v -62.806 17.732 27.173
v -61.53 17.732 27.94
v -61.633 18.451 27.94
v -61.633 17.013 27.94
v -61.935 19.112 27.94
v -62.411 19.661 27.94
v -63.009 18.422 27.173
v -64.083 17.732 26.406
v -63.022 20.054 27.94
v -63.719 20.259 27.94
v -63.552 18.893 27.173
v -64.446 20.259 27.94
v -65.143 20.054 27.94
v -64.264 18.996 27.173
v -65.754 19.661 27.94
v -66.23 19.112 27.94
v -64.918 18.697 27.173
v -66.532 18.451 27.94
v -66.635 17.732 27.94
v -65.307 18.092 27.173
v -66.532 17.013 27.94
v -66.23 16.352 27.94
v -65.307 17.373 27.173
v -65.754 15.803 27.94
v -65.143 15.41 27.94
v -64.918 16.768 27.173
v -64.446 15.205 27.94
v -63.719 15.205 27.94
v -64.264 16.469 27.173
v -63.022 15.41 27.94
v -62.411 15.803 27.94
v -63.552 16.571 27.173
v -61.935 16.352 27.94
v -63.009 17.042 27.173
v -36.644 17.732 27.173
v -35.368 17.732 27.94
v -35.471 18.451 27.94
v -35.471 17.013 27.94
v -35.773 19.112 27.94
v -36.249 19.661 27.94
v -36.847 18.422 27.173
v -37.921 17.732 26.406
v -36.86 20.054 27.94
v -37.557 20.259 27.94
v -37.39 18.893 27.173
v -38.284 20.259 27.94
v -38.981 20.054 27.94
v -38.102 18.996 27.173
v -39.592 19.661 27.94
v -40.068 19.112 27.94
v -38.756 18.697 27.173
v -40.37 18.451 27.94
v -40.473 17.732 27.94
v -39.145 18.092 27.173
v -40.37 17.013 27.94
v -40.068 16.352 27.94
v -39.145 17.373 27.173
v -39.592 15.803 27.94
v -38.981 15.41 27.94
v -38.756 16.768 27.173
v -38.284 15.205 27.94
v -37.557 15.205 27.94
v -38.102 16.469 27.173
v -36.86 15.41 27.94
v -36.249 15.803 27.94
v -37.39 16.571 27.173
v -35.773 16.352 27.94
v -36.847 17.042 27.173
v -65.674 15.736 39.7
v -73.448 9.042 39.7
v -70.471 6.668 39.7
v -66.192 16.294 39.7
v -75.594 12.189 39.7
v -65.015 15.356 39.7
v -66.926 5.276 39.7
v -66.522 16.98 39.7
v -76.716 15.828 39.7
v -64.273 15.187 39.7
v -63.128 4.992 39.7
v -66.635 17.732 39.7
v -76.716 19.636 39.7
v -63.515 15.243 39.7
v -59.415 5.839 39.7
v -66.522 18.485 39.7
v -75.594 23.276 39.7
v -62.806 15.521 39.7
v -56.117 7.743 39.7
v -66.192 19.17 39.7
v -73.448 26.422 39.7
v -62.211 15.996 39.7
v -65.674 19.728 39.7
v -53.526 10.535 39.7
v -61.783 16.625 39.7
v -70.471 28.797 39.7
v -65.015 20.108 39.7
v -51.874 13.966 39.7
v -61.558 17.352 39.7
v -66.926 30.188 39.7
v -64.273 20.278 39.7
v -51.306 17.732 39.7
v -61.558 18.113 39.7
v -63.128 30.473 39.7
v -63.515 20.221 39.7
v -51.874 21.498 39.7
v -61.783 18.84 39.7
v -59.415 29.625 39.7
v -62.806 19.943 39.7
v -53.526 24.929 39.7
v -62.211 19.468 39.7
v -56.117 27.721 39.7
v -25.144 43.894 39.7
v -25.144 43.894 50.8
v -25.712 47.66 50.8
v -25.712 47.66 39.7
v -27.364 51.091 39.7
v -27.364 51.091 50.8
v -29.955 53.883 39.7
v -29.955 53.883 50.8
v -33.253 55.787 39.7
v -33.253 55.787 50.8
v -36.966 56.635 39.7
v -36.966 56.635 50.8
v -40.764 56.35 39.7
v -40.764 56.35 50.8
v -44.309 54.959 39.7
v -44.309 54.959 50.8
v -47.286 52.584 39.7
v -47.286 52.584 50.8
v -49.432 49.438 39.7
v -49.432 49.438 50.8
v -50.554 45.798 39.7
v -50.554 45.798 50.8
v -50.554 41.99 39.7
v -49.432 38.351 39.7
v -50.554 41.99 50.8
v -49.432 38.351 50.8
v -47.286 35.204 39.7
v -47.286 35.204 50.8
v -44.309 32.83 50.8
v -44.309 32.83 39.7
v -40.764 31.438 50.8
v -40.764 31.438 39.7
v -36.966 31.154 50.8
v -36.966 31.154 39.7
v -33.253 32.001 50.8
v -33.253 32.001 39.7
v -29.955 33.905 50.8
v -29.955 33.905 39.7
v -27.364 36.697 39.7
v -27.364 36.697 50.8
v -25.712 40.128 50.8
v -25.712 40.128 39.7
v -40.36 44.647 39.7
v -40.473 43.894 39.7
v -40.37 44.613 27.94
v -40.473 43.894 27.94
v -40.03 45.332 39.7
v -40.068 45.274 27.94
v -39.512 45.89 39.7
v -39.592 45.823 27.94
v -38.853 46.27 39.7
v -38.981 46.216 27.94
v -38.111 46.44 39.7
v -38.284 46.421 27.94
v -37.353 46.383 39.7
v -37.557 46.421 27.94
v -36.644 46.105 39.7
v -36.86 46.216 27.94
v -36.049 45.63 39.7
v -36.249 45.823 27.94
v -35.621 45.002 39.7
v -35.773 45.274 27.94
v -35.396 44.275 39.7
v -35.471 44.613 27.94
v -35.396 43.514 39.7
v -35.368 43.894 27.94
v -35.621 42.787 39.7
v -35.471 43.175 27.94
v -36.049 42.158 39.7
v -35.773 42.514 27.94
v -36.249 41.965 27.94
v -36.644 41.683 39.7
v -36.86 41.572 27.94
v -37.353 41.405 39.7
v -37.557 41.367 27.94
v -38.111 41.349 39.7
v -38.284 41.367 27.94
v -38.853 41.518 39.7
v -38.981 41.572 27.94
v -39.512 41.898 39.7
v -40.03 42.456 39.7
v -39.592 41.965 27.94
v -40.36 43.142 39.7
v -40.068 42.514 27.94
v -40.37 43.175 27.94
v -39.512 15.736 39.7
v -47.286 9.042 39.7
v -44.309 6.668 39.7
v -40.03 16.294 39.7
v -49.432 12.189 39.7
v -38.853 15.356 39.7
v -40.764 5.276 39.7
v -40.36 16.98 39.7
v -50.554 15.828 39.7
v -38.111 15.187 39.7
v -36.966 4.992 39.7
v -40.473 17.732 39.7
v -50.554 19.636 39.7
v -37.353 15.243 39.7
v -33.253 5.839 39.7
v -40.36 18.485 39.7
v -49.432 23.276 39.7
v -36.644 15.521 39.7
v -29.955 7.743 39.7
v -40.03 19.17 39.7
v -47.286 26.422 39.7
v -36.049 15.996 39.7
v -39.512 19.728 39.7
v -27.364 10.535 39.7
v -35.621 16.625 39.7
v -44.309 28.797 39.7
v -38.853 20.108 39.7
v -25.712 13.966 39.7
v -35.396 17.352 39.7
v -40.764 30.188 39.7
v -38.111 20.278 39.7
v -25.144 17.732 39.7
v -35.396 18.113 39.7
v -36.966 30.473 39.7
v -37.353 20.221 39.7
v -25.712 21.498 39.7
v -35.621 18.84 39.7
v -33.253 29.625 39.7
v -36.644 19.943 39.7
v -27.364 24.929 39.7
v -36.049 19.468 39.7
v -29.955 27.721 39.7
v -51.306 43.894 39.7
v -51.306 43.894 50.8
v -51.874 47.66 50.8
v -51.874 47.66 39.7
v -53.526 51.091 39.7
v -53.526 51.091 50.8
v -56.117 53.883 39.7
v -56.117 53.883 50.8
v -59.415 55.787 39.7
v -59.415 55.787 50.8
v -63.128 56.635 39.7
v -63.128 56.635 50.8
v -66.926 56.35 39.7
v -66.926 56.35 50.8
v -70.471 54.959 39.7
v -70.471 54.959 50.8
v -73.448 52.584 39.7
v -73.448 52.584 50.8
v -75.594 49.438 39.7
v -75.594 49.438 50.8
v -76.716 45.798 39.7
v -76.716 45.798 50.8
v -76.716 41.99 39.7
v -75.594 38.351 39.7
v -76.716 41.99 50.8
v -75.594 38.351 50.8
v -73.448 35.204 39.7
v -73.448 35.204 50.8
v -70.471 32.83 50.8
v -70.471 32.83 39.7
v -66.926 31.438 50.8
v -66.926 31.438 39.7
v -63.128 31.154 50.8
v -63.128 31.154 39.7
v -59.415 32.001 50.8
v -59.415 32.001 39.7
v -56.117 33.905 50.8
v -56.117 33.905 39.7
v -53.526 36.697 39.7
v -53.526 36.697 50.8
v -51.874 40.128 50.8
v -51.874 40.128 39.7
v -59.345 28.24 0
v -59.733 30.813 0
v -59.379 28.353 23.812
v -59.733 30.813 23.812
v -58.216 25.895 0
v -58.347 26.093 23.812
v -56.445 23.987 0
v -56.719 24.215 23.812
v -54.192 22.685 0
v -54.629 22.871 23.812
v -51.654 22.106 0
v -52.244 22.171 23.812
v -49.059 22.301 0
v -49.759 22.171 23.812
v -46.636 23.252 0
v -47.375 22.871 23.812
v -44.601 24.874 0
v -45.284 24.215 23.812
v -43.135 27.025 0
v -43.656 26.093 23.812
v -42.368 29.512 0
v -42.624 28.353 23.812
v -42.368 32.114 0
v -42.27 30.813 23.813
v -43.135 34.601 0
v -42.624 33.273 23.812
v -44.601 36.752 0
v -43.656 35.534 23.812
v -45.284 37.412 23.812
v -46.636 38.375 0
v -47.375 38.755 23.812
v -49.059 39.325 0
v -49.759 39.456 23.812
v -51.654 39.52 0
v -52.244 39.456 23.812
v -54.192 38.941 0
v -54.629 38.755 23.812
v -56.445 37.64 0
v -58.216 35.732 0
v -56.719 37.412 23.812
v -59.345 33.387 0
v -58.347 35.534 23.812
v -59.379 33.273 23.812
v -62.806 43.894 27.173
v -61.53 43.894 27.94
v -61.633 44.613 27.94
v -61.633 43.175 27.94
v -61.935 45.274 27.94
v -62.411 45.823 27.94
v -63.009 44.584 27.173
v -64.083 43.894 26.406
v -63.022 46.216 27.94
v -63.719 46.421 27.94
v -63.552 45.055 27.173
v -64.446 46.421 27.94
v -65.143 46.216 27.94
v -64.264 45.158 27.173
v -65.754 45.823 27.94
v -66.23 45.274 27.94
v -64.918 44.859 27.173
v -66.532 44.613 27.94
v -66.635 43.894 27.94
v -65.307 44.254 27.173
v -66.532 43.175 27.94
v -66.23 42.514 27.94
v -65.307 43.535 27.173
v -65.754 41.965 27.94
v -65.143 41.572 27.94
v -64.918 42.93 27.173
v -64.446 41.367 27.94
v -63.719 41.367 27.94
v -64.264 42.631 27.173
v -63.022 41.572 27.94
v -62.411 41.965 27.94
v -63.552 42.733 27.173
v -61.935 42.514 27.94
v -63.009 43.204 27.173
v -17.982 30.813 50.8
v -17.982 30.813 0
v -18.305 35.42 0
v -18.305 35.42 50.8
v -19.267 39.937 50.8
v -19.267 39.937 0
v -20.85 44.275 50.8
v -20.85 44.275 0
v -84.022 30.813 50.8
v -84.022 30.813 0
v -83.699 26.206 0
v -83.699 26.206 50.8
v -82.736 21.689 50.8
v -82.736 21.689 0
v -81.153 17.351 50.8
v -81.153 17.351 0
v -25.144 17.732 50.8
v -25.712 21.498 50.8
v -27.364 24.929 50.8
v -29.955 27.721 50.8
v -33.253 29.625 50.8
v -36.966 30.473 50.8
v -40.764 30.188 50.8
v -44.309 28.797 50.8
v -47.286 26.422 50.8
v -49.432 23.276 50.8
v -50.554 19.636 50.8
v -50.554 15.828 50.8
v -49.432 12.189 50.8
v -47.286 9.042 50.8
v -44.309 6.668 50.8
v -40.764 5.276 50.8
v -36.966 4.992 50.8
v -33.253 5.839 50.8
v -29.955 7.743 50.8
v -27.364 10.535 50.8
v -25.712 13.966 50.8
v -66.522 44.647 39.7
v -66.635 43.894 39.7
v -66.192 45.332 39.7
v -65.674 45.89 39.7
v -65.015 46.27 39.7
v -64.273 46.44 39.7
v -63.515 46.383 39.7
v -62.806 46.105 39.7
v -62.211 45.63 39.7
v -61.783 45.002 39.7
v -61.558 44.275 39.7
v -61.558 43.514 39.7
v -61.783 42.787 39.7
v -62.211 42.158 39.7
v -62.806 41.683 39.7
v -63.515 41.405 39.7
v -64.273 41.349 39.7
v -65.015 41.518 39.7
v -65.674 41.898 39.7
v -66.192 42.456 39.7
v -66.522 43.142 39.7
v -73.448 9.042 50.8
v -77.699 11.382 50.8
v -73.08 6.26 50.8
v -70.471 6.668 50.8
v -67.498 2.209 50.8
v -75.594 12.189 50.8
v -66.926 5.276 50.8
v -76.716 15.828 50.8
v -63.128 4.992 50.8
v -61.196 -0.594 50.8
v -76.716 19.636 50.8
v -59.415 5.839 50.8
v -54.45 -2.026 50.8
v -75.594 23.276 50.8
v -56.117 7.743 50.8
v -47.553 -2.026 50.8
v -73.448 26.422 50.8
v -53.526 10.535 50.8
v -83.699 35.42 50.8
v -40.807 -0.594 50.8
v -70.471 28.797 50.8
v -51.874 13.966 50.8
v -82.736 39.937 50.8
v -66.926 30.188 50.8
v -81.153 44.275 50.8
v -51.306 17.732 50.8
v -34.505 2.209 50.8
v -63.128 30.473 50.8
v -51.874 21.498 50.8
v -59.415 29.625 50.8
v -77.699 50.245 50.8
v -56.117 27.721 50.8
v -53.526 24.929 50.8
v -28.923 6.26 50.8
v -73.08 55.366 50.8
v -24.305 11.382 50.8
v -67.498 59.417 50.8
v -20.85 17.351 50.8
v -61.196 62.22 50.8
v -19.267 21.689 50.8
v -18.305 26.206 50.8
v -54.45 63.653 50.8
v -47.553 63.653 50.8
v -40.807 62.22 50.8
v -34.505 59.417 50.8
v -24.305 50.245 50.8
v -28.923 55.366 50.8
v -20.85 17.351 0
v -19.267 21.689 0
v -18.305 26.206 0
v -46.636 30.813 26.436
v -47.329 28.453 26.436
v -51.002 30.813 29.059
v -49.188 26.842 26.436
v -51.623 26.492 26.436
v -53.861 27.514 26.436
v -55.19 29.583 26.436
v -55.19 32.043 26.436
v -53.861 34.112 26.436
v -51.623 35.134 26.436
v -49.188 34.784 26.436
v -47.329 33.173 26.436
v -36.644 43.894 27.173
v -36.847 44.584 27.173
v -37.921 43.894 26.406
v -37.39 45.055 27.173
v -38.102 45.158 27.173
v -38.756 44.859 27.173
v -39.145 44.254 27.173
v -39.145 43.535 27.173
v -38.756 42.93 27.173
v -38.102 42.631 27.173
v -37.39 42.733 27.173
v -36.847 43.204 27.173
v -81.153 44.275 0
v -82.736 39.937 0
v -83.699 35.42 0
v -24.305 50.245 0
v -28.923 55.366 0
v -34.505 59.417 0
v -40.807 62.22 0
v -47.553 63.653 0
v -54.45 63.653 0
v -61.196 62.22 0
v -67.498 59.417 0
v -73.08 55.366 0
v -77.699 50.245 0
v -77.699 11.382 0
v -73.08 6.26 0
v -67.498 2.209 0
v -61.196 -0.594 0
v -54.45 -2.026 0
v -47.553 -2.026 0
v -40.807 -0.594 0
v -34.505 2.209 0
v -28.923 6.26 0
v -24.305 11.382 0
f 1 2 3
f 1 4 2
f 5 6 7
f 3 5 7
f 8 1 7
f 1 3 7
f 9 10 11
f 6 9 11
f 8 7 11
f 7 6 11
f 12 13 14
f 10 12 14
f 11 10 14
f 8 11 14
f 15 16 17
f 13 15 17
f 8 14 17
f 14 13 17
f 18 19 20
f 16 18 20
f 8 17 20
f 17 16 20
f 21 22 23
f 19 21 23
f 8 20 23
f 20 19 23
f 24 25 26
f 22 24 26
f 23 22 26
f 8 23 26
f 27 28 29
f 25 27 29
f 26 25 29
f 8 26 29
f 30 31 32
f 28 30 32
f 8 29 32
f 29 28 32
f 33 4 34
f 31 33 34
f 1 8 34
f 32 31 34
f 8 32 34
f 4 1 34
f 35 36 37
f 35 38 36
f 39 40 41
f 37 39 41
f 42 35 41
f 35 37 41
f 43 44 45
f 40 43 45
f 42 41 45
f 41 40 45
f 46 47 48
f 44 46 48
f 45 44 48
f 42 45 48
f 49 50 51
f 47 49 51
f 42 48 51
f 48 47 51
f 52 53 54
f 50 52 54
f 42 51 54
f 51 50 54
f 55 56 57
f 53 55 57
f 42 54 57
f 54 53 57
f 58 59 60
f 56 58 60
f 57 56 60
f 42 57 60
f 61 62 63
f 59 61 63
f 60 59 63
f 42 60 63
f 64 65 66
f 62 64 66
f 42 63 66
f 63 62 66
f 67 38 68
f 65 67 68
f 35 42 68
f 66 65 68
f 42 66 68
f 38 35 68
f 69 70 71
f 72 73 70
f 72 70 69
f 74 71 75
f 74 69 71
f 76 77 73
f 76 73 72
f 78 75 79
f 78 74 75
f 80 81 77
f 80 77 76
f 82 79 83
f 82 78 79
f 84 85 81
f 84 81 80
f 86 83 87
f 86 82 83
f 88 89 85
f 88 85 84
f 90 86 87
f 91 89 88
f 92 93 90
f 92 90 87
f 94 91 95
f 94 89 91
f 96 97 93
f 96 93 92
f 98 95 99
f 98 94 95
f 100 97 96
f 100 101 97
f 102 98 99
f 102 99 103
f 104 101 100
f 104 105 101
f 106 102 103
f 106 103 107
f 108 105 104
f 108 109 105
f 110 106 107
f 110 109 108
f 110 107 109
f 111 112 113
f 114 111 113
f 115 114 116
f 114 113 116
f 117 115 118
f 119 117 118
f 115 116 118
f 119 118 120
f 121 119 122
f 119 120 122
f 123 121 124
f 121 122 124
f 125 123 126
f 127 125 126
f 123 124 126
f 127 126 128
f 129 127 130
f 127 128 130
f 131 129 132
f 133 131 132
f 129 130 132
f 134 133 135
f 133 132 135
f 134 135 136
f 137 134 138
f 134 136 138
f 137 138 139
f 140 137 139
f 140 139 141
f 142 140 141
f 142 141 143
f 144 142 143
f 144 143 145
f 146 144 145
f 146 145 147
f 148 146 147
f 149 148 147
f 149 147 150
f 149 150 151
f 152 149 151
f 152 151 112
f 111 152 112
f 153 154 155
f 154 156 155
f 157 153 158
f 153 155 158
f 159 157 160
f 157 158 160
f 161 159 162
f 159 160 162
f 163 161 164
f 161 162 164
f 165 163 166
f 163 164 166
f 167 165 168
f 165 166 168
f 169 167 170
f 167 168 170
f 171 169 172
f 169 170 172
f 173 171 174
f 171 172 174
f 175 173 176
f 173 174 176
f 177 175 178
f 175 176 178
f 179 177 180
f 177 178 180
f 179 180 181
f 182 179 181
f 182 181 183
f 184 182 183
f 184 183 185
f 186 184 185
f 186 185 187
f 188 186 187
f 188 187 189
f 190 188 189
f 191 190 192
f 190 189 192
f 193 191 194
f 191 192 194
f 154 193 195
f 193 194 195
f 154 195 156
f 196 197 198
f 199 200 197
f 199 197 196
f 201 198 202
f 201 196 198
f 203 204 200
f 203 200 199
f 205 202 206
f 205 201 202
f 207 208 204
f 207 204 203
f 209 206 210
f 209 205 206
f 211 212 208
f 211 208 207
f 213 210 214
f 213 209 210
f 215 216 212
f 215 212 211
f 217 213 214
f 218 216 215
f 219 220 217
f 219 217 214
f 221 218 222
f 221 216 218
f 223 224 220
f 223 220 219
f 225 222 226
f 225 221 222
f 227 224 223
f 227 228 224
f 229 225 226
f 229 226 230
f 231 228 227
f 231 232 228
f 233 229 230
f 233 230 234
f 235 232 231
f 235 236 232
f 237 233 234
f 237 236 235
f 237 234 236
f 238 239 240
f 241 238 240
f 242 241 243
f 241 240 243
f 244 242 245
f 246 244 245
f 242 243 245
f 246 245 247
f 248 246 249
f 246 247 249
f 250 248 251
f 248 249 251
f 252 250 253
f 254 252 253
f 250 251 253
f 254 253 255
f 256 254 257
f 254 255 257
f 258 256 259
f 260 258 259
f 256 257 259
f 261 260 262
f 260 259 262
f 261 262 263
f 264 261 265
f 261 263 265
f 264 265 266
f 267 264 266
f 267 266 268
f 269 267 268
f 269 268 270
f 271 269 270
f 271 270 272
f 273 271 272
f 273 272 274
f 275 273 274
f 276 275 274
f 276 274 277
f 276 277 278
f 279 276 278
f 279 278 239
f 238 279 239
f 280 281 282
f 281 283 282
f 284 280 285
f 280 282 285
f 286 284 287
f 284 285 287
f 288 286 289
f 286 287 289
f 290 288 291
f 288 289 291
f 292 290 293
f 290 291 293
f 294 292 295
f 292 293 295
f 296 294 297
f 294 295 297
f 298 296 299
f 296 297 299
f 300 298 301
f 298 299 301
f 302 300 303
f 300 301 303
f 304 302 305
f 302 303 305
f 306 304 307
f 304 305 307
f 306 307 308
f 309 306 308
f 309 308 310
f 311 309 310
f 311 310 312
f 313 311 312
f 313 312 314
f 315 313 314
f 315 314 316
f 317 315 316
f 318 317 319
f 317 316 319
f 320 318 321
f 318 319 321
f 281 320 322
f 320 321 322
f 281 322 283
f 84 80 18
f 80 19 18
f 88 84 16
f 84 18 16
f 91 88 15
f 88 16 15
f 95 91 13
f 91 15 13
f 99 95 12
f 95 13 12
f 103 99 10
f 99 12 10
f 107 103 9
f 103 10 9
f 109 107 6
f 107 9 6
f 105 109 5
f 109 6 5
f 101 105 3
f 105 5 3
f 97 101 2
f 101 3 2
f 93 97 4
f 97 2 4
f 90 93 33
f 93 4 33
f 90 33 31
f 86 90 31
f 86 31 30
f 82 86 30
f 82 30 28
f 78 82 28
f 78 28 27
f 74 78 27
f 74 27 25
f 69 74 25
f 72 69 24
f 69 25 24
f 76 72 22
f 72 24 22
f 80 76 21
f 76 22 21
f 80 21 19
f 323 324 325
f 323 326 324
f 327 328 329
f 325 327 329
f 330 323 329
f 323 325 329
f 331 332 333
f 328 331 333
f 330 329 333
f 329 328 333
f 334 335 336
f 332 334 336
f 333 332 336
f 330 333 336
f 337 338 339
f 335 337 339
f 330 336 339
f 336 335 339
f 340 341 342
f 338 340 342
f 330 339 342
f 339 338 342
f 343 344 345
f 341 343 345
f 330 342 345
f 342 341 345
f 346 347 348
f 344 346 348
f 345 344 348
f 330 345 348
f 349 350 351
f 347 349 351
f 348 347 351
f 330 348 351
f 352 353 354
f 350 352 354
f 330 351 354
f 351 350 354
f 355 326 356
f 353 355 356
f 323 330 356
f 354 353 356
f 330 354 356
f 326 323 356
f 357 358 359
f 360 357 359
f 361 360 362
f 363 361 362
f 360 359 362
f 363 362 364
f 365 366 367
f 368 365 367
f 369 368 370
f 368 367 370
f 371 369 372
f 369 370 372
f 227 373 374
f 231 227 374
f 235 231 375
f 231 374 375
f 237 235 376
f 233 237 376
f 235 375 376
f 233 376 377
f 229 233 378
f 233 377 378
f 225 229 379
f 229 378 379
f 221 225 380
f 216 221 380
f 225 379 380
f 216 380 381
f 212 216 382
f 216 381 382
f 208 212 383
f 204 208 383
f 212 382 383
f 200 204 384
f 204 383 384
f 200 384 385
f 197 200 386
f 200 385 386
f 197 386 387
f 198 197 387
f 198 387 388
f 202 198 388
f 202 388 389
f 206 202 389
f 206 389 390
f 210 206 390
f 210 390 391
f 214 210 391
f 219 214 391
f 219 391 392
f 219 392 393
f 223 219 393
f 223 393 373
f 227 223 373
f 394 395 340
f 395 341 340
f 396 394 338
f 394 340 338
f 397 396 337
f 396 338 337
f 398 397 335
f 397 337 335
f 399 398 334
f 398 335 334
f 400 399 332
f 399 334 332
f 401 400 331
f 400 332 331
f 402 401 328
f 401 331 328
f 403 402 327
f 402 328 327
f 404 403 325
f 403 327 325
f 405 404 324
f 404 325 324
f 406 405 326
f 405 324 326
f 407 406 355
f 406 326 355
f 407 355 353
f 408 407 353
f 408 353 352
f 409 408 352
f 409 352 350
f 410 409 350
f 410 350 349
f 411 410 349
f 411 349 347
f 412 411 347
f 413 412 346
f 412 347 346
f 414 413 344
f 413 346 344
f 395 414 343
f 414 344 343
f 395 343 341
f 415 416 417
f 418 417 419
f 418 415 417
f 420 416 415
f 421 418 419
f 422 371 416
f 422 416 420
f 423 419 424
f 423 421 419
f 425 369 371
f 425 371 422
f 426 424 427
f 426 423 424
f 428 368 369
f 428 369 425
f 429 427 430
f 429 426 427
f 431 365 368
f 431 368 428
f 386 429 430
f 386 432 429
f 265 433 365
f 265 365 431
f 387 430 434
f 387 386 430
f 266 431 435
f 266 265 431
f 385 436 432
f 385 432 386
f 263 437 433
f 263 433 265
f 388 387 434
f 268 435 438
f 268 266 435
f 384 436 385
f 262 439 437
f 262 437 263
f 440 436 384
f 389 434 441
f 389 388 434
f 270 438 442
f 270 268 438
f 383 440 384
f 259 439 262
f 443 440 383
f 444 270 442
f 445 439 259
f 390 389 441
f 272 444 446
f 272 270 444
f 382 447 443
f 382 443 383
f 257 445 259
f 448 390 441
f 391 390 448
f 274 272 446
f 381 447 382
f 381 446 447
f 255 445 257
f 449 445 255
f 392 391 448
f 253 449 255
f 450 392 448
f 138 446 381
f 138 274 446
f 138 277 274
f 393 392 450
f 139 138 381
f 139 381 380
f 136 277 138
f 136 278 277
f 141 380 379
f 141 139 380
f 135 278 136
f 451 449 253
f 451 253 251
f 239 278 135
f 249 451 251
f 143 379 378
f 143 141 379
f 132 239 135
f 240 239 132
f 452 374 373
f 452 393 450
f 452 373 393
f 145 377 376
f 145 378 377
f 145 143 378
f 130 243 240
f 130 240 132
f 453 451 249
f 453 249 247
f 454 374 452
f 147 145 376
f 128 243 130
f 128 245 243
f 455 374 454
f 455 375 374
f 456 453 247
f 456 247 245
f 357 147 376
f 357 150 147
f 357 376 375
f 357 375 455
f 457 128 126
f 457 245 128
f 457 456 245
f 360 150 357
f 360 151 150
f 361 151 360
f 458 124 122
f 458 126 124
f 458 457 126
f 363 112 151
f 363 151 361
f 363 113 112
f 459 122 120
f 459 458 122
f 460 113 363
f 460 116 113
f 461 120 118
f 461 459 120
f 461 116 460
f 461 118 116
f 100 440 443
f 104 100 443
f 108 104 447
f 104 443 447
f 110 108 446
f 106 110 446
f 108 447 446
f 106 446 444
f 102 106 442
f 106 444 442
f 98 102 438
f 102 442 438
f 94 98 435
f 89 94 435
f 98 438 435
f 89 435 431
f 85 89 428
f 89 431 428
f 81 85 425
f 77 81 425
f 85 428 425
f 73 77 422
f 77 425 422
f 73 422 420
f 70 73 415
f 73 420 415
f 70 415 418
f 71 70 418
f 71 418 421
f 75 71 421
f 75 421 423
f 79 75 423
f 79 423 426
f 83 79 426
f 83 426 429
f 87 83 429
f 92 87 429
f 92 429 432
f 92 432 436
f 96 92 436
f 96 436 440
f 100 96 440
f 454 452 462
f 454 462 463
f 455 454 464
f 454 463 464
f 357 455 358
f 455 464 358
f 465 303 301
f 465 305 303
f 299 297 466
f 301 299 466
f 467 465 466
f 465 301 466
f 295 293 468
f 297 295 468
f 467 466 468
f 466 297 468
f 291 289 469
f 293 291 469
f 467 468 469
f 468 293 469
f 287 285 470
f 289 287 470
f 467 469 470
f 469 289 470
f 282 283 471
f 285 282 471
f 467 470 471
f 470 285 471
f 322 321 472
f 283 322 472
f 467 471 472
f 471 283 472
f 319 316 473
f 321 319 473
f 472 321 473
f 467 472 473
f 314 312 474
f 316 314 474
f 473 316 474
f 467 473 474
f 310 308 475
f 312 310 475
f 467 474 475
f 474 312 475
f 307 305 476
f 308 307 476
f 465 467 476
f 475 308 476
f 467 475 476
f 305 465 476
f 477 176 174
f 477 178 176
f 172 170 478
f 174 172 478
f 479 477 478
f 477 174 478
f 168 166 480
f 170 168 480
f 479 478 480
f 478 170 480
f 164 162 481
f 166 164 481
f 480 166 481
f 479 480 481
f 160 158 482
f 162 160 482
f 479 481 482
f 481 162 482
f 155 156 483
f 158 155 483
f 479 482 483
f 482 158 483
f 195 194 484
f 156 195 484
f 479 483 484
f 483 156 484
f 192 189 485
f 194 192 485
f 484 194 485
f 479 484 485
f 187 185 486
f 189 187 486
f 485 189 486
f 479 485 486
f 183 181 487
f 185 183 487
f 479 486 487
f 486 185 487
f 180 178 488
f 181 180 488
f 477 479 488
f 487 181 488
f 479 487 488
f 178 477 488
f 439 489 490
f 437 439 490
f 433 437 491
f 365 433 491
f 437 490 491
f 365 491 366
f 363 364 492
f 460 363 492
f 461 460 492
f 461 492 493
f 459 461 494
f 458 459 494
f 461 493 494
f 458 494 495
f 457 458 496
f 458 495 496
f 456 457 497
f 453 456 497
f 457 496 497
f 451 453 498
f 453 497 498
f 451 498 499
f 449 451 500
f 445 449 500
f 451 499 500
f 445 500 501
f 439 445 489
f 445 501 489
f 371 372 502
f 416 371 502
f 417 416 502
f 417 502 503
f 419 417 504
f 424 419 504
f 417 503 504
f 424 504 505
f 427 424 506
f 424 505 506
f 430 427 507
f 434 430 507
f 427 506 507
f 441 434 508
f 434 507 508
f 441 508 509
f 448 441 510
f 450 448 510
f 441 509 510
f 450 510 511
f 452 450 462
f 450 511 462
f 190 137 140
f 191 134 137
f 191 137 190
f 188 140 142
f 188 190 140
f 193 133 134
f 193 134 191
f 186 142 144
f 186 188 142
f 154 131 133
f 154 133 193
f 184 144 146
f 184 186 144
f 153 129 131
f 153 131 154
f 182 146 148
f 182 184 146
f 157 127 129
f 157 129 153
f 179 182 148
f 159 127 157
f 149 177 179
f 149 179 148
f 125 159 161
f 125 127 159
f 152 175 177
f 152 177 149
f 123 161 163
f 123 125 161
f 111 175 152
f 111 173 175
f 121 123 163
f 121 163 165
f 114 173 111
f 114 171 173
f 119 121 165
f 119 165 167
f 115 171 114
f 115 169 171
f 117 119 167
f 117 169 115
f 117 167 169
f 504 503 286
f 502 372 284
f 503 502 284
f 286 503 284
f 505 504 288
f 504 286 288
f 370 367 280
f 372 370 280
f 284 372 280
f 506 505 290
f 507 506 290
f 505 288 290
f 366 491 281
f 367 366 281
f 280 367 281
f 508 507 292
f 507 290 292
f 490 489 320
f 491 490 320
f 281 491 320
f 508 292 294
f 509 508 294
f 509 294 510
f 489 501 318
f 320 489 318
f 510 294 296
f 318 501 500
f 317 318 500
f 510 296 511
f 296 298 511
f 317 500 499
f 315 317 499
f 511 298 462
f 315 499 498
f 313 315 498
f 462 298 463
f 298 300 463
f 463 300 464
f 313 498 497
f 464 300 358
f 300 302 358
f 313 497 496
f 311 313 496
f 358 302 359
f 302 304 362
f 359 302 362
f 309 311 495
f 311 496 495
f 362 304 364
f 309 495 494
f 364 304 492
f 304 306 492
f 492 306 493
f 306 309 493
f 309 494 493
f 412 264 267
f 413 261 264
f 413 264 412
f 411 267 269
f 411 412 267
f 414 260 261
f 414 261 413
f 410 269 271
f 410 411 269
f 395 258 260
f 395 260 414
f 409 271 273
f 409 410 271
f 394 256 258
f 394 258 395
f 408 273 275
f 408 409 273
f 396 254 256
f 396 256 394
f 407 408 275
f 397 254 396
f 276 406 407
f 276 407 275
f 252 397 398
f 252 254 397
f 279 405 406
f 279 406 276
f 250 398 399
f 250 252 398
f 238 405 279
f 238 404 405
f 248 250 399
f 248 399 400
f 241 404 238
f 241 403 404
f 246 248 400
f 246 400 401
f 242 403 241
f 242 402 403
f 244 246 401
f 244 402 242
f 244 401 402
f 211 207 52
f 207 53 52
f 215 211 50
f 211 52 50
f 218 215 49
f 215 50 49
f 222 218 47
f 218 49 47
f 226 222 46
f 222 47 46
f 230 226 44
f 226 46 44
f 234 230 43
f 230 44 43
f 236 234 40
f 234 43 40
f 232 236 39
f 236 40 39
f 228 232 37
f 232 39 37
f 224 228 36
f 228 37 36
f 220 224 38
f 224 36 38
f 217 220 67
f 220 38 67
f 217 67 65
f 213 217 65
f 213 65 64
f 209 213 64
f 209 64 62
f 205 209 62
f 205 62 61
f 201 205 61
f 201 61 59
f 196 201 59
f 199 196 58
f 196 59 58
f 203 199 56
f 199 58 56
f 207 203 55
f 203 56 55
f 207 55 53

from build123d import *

# Parameters (mm, degrees)
F0_W           = 13.462
F0_H           = 13.462
F1_DEPTH       = 50.8
F5_D           = 5.1054
F5_DEPTH       = 22.86
F5_CBORE_D     = 25.5524
F5_CBORE_DEPTH = 11.0998
F5_TIP         = 1.5338169022
F6_D           = 17.4625
F6_DEPTH       = 23.8125
F6_TIP         = 5.2462642799


with BuildPart() as f1:
    # F0 (on Top) → F1 (new body)
    with BuildSketch(Plane.XY):
        with BuildLine():
            Line((-37.5396344488, 30.8131494279), (-17.9816344488, 30.8131494279))
            ThreePointArc((-17.9816344488, 30.8131494279), (-18.7067968135, 37.6952902366), (-20.8504328807, 44.2751494279))
            Line((-20.8504328807, 44.2751494279), (-51.0016344488, 44.2751494279))
            Line((-51.0016344488, 44.2751494279), (-51.0016344488, 30.8131494279))
            Line((-51.0016344488, 30.8131494279), (-37.5396344488, 30.8131494279))
        make_face()
        with BuildLine():
            Line((-51.0016344488, 44.2751494279), (-20.8504328807, 44.2751494279))
            ThreePointArc((-20.8504328807, 44.2751494279), (-51.0016344488, 63.8331494279), (-81.1528360169, 44.2751494279))
            Line((-81.1528360169, 44.2751494279), (-51.0016344488, 44.2751494279))
        make_face()
        with BuildLine():
            Line((-51.0016344488, 44.2751494279), (-81.1528360169, 44.2751494279))
            ThreePointArc((-81.1528360169, 44.2751494279), (-83.296472084, 37.6952902366), (-84.0216344488, 30.8131494279))
            Line((-84.0216344488, 30.8131494279), (-64.4636344488, 30.8131494279))
            Line((-64.4636344488, 30.8131494279), (-51.0016344488, 30.8131494279))
            Line((-51.0016344488, 30.8131494279), (-51.0016344488, 44.2751494279))
        make_face()
        with BuildLine():
            ThreePointArc((-84.0216344488, 30.8131494279), (-83.296472084, 23.9310086192), (-81.1528360169, 17.3511494279))
            Line((-81.1528360169, 17.3511494279), (-64.4636344488, 17.3511494279))
            Line((-64.4636344488, 17.3511494279), (-64.4636344488, 30.8131494279))
            Line((-64.4636344488, 30.8131494279), (-84.0216344488, 30.8131494279))
        make_face()
        with BuildLine():
            ThreePointArc((-81.1528360169, 17.3511494279), (-51.0016344488, -2.2068505721), (-20.8504328807, 17.3511494279))
            Line((-20.8504328807, 17.3511494279), (-37.5396344488, 17.3511494279))
            Line((-37.5396344488, 17.3511494279), (-51.0016344488, 17.3511494279))
            Line((-51.0016344488, 17.3511494279), (-64.4636344488, 17.3511494279))
            Line((-64.4636344488, 17.3511494279), (-81.1528360169, 17.3511494279))
        make_face()
        with BuildLine():
            ThreePointArc((-20.8504328807, 17.3511494279), (-18.7067968135, 23.9310086192), (-17.9816344488, 30.8131494279))
            Line((-17.9816344488, 30.8131494279), (-37.5396344488, 30.8131494279))
            Line((-37.5396344488, 30.8131494279), (-37.5396344488, 17.3511494279))
            Line((-37.5396344488, 17.3511494279), (-20.8504328807, 17.3511494279))
        make_face()
        with Locations((-57.7326344488, 24.0821494279)):
            Rectangle(F0_W, F0_H)
        with Locations((-44.2706344488, 24.0821494279)):
            Rectangle(F0_W, F0_H)
    extrude(amount=F1_DEPTH)

    # F5
    with Locations(Plane.XY.offset(50.8)):
        with Locations((-64.0826344488, 43.8941494279), (-37.9206344488, 43.8941494279), (-37.9206344488, 17.7321494279), (-64.0826344488, 17.7321494279)):
            CounterBoreHole(F5_D / 2, F5_CBORE_D / 2, F5_CBORE_DEPTH, depth=F5_DEPTH)
            with Locations((0, 0, -(F5_DEPTH + F5_TIP / 2))):  # 118° drill point
                Cone(0, F5_D / 2, F5_TIP, mode=Mode.SUBTRACT)

    # F6
    with Locations(Plane(origin=(0, 0, 0), x_dir=(1, 0, 0), z_dir=(0, 0, -1))):
        with Locations((-51.0016344488, -30.8131494279)):
            Hole(F6_D / 2, depth=F6_DEPTH)
            with Locations((0, 0, -(F6_DEPTH + F6_TIP / 2))):  # 118° drill point
                Cone(0, F6_D / 2, F6_TIP, mode=Mode.SUBTRACT)


solid = f1.part
